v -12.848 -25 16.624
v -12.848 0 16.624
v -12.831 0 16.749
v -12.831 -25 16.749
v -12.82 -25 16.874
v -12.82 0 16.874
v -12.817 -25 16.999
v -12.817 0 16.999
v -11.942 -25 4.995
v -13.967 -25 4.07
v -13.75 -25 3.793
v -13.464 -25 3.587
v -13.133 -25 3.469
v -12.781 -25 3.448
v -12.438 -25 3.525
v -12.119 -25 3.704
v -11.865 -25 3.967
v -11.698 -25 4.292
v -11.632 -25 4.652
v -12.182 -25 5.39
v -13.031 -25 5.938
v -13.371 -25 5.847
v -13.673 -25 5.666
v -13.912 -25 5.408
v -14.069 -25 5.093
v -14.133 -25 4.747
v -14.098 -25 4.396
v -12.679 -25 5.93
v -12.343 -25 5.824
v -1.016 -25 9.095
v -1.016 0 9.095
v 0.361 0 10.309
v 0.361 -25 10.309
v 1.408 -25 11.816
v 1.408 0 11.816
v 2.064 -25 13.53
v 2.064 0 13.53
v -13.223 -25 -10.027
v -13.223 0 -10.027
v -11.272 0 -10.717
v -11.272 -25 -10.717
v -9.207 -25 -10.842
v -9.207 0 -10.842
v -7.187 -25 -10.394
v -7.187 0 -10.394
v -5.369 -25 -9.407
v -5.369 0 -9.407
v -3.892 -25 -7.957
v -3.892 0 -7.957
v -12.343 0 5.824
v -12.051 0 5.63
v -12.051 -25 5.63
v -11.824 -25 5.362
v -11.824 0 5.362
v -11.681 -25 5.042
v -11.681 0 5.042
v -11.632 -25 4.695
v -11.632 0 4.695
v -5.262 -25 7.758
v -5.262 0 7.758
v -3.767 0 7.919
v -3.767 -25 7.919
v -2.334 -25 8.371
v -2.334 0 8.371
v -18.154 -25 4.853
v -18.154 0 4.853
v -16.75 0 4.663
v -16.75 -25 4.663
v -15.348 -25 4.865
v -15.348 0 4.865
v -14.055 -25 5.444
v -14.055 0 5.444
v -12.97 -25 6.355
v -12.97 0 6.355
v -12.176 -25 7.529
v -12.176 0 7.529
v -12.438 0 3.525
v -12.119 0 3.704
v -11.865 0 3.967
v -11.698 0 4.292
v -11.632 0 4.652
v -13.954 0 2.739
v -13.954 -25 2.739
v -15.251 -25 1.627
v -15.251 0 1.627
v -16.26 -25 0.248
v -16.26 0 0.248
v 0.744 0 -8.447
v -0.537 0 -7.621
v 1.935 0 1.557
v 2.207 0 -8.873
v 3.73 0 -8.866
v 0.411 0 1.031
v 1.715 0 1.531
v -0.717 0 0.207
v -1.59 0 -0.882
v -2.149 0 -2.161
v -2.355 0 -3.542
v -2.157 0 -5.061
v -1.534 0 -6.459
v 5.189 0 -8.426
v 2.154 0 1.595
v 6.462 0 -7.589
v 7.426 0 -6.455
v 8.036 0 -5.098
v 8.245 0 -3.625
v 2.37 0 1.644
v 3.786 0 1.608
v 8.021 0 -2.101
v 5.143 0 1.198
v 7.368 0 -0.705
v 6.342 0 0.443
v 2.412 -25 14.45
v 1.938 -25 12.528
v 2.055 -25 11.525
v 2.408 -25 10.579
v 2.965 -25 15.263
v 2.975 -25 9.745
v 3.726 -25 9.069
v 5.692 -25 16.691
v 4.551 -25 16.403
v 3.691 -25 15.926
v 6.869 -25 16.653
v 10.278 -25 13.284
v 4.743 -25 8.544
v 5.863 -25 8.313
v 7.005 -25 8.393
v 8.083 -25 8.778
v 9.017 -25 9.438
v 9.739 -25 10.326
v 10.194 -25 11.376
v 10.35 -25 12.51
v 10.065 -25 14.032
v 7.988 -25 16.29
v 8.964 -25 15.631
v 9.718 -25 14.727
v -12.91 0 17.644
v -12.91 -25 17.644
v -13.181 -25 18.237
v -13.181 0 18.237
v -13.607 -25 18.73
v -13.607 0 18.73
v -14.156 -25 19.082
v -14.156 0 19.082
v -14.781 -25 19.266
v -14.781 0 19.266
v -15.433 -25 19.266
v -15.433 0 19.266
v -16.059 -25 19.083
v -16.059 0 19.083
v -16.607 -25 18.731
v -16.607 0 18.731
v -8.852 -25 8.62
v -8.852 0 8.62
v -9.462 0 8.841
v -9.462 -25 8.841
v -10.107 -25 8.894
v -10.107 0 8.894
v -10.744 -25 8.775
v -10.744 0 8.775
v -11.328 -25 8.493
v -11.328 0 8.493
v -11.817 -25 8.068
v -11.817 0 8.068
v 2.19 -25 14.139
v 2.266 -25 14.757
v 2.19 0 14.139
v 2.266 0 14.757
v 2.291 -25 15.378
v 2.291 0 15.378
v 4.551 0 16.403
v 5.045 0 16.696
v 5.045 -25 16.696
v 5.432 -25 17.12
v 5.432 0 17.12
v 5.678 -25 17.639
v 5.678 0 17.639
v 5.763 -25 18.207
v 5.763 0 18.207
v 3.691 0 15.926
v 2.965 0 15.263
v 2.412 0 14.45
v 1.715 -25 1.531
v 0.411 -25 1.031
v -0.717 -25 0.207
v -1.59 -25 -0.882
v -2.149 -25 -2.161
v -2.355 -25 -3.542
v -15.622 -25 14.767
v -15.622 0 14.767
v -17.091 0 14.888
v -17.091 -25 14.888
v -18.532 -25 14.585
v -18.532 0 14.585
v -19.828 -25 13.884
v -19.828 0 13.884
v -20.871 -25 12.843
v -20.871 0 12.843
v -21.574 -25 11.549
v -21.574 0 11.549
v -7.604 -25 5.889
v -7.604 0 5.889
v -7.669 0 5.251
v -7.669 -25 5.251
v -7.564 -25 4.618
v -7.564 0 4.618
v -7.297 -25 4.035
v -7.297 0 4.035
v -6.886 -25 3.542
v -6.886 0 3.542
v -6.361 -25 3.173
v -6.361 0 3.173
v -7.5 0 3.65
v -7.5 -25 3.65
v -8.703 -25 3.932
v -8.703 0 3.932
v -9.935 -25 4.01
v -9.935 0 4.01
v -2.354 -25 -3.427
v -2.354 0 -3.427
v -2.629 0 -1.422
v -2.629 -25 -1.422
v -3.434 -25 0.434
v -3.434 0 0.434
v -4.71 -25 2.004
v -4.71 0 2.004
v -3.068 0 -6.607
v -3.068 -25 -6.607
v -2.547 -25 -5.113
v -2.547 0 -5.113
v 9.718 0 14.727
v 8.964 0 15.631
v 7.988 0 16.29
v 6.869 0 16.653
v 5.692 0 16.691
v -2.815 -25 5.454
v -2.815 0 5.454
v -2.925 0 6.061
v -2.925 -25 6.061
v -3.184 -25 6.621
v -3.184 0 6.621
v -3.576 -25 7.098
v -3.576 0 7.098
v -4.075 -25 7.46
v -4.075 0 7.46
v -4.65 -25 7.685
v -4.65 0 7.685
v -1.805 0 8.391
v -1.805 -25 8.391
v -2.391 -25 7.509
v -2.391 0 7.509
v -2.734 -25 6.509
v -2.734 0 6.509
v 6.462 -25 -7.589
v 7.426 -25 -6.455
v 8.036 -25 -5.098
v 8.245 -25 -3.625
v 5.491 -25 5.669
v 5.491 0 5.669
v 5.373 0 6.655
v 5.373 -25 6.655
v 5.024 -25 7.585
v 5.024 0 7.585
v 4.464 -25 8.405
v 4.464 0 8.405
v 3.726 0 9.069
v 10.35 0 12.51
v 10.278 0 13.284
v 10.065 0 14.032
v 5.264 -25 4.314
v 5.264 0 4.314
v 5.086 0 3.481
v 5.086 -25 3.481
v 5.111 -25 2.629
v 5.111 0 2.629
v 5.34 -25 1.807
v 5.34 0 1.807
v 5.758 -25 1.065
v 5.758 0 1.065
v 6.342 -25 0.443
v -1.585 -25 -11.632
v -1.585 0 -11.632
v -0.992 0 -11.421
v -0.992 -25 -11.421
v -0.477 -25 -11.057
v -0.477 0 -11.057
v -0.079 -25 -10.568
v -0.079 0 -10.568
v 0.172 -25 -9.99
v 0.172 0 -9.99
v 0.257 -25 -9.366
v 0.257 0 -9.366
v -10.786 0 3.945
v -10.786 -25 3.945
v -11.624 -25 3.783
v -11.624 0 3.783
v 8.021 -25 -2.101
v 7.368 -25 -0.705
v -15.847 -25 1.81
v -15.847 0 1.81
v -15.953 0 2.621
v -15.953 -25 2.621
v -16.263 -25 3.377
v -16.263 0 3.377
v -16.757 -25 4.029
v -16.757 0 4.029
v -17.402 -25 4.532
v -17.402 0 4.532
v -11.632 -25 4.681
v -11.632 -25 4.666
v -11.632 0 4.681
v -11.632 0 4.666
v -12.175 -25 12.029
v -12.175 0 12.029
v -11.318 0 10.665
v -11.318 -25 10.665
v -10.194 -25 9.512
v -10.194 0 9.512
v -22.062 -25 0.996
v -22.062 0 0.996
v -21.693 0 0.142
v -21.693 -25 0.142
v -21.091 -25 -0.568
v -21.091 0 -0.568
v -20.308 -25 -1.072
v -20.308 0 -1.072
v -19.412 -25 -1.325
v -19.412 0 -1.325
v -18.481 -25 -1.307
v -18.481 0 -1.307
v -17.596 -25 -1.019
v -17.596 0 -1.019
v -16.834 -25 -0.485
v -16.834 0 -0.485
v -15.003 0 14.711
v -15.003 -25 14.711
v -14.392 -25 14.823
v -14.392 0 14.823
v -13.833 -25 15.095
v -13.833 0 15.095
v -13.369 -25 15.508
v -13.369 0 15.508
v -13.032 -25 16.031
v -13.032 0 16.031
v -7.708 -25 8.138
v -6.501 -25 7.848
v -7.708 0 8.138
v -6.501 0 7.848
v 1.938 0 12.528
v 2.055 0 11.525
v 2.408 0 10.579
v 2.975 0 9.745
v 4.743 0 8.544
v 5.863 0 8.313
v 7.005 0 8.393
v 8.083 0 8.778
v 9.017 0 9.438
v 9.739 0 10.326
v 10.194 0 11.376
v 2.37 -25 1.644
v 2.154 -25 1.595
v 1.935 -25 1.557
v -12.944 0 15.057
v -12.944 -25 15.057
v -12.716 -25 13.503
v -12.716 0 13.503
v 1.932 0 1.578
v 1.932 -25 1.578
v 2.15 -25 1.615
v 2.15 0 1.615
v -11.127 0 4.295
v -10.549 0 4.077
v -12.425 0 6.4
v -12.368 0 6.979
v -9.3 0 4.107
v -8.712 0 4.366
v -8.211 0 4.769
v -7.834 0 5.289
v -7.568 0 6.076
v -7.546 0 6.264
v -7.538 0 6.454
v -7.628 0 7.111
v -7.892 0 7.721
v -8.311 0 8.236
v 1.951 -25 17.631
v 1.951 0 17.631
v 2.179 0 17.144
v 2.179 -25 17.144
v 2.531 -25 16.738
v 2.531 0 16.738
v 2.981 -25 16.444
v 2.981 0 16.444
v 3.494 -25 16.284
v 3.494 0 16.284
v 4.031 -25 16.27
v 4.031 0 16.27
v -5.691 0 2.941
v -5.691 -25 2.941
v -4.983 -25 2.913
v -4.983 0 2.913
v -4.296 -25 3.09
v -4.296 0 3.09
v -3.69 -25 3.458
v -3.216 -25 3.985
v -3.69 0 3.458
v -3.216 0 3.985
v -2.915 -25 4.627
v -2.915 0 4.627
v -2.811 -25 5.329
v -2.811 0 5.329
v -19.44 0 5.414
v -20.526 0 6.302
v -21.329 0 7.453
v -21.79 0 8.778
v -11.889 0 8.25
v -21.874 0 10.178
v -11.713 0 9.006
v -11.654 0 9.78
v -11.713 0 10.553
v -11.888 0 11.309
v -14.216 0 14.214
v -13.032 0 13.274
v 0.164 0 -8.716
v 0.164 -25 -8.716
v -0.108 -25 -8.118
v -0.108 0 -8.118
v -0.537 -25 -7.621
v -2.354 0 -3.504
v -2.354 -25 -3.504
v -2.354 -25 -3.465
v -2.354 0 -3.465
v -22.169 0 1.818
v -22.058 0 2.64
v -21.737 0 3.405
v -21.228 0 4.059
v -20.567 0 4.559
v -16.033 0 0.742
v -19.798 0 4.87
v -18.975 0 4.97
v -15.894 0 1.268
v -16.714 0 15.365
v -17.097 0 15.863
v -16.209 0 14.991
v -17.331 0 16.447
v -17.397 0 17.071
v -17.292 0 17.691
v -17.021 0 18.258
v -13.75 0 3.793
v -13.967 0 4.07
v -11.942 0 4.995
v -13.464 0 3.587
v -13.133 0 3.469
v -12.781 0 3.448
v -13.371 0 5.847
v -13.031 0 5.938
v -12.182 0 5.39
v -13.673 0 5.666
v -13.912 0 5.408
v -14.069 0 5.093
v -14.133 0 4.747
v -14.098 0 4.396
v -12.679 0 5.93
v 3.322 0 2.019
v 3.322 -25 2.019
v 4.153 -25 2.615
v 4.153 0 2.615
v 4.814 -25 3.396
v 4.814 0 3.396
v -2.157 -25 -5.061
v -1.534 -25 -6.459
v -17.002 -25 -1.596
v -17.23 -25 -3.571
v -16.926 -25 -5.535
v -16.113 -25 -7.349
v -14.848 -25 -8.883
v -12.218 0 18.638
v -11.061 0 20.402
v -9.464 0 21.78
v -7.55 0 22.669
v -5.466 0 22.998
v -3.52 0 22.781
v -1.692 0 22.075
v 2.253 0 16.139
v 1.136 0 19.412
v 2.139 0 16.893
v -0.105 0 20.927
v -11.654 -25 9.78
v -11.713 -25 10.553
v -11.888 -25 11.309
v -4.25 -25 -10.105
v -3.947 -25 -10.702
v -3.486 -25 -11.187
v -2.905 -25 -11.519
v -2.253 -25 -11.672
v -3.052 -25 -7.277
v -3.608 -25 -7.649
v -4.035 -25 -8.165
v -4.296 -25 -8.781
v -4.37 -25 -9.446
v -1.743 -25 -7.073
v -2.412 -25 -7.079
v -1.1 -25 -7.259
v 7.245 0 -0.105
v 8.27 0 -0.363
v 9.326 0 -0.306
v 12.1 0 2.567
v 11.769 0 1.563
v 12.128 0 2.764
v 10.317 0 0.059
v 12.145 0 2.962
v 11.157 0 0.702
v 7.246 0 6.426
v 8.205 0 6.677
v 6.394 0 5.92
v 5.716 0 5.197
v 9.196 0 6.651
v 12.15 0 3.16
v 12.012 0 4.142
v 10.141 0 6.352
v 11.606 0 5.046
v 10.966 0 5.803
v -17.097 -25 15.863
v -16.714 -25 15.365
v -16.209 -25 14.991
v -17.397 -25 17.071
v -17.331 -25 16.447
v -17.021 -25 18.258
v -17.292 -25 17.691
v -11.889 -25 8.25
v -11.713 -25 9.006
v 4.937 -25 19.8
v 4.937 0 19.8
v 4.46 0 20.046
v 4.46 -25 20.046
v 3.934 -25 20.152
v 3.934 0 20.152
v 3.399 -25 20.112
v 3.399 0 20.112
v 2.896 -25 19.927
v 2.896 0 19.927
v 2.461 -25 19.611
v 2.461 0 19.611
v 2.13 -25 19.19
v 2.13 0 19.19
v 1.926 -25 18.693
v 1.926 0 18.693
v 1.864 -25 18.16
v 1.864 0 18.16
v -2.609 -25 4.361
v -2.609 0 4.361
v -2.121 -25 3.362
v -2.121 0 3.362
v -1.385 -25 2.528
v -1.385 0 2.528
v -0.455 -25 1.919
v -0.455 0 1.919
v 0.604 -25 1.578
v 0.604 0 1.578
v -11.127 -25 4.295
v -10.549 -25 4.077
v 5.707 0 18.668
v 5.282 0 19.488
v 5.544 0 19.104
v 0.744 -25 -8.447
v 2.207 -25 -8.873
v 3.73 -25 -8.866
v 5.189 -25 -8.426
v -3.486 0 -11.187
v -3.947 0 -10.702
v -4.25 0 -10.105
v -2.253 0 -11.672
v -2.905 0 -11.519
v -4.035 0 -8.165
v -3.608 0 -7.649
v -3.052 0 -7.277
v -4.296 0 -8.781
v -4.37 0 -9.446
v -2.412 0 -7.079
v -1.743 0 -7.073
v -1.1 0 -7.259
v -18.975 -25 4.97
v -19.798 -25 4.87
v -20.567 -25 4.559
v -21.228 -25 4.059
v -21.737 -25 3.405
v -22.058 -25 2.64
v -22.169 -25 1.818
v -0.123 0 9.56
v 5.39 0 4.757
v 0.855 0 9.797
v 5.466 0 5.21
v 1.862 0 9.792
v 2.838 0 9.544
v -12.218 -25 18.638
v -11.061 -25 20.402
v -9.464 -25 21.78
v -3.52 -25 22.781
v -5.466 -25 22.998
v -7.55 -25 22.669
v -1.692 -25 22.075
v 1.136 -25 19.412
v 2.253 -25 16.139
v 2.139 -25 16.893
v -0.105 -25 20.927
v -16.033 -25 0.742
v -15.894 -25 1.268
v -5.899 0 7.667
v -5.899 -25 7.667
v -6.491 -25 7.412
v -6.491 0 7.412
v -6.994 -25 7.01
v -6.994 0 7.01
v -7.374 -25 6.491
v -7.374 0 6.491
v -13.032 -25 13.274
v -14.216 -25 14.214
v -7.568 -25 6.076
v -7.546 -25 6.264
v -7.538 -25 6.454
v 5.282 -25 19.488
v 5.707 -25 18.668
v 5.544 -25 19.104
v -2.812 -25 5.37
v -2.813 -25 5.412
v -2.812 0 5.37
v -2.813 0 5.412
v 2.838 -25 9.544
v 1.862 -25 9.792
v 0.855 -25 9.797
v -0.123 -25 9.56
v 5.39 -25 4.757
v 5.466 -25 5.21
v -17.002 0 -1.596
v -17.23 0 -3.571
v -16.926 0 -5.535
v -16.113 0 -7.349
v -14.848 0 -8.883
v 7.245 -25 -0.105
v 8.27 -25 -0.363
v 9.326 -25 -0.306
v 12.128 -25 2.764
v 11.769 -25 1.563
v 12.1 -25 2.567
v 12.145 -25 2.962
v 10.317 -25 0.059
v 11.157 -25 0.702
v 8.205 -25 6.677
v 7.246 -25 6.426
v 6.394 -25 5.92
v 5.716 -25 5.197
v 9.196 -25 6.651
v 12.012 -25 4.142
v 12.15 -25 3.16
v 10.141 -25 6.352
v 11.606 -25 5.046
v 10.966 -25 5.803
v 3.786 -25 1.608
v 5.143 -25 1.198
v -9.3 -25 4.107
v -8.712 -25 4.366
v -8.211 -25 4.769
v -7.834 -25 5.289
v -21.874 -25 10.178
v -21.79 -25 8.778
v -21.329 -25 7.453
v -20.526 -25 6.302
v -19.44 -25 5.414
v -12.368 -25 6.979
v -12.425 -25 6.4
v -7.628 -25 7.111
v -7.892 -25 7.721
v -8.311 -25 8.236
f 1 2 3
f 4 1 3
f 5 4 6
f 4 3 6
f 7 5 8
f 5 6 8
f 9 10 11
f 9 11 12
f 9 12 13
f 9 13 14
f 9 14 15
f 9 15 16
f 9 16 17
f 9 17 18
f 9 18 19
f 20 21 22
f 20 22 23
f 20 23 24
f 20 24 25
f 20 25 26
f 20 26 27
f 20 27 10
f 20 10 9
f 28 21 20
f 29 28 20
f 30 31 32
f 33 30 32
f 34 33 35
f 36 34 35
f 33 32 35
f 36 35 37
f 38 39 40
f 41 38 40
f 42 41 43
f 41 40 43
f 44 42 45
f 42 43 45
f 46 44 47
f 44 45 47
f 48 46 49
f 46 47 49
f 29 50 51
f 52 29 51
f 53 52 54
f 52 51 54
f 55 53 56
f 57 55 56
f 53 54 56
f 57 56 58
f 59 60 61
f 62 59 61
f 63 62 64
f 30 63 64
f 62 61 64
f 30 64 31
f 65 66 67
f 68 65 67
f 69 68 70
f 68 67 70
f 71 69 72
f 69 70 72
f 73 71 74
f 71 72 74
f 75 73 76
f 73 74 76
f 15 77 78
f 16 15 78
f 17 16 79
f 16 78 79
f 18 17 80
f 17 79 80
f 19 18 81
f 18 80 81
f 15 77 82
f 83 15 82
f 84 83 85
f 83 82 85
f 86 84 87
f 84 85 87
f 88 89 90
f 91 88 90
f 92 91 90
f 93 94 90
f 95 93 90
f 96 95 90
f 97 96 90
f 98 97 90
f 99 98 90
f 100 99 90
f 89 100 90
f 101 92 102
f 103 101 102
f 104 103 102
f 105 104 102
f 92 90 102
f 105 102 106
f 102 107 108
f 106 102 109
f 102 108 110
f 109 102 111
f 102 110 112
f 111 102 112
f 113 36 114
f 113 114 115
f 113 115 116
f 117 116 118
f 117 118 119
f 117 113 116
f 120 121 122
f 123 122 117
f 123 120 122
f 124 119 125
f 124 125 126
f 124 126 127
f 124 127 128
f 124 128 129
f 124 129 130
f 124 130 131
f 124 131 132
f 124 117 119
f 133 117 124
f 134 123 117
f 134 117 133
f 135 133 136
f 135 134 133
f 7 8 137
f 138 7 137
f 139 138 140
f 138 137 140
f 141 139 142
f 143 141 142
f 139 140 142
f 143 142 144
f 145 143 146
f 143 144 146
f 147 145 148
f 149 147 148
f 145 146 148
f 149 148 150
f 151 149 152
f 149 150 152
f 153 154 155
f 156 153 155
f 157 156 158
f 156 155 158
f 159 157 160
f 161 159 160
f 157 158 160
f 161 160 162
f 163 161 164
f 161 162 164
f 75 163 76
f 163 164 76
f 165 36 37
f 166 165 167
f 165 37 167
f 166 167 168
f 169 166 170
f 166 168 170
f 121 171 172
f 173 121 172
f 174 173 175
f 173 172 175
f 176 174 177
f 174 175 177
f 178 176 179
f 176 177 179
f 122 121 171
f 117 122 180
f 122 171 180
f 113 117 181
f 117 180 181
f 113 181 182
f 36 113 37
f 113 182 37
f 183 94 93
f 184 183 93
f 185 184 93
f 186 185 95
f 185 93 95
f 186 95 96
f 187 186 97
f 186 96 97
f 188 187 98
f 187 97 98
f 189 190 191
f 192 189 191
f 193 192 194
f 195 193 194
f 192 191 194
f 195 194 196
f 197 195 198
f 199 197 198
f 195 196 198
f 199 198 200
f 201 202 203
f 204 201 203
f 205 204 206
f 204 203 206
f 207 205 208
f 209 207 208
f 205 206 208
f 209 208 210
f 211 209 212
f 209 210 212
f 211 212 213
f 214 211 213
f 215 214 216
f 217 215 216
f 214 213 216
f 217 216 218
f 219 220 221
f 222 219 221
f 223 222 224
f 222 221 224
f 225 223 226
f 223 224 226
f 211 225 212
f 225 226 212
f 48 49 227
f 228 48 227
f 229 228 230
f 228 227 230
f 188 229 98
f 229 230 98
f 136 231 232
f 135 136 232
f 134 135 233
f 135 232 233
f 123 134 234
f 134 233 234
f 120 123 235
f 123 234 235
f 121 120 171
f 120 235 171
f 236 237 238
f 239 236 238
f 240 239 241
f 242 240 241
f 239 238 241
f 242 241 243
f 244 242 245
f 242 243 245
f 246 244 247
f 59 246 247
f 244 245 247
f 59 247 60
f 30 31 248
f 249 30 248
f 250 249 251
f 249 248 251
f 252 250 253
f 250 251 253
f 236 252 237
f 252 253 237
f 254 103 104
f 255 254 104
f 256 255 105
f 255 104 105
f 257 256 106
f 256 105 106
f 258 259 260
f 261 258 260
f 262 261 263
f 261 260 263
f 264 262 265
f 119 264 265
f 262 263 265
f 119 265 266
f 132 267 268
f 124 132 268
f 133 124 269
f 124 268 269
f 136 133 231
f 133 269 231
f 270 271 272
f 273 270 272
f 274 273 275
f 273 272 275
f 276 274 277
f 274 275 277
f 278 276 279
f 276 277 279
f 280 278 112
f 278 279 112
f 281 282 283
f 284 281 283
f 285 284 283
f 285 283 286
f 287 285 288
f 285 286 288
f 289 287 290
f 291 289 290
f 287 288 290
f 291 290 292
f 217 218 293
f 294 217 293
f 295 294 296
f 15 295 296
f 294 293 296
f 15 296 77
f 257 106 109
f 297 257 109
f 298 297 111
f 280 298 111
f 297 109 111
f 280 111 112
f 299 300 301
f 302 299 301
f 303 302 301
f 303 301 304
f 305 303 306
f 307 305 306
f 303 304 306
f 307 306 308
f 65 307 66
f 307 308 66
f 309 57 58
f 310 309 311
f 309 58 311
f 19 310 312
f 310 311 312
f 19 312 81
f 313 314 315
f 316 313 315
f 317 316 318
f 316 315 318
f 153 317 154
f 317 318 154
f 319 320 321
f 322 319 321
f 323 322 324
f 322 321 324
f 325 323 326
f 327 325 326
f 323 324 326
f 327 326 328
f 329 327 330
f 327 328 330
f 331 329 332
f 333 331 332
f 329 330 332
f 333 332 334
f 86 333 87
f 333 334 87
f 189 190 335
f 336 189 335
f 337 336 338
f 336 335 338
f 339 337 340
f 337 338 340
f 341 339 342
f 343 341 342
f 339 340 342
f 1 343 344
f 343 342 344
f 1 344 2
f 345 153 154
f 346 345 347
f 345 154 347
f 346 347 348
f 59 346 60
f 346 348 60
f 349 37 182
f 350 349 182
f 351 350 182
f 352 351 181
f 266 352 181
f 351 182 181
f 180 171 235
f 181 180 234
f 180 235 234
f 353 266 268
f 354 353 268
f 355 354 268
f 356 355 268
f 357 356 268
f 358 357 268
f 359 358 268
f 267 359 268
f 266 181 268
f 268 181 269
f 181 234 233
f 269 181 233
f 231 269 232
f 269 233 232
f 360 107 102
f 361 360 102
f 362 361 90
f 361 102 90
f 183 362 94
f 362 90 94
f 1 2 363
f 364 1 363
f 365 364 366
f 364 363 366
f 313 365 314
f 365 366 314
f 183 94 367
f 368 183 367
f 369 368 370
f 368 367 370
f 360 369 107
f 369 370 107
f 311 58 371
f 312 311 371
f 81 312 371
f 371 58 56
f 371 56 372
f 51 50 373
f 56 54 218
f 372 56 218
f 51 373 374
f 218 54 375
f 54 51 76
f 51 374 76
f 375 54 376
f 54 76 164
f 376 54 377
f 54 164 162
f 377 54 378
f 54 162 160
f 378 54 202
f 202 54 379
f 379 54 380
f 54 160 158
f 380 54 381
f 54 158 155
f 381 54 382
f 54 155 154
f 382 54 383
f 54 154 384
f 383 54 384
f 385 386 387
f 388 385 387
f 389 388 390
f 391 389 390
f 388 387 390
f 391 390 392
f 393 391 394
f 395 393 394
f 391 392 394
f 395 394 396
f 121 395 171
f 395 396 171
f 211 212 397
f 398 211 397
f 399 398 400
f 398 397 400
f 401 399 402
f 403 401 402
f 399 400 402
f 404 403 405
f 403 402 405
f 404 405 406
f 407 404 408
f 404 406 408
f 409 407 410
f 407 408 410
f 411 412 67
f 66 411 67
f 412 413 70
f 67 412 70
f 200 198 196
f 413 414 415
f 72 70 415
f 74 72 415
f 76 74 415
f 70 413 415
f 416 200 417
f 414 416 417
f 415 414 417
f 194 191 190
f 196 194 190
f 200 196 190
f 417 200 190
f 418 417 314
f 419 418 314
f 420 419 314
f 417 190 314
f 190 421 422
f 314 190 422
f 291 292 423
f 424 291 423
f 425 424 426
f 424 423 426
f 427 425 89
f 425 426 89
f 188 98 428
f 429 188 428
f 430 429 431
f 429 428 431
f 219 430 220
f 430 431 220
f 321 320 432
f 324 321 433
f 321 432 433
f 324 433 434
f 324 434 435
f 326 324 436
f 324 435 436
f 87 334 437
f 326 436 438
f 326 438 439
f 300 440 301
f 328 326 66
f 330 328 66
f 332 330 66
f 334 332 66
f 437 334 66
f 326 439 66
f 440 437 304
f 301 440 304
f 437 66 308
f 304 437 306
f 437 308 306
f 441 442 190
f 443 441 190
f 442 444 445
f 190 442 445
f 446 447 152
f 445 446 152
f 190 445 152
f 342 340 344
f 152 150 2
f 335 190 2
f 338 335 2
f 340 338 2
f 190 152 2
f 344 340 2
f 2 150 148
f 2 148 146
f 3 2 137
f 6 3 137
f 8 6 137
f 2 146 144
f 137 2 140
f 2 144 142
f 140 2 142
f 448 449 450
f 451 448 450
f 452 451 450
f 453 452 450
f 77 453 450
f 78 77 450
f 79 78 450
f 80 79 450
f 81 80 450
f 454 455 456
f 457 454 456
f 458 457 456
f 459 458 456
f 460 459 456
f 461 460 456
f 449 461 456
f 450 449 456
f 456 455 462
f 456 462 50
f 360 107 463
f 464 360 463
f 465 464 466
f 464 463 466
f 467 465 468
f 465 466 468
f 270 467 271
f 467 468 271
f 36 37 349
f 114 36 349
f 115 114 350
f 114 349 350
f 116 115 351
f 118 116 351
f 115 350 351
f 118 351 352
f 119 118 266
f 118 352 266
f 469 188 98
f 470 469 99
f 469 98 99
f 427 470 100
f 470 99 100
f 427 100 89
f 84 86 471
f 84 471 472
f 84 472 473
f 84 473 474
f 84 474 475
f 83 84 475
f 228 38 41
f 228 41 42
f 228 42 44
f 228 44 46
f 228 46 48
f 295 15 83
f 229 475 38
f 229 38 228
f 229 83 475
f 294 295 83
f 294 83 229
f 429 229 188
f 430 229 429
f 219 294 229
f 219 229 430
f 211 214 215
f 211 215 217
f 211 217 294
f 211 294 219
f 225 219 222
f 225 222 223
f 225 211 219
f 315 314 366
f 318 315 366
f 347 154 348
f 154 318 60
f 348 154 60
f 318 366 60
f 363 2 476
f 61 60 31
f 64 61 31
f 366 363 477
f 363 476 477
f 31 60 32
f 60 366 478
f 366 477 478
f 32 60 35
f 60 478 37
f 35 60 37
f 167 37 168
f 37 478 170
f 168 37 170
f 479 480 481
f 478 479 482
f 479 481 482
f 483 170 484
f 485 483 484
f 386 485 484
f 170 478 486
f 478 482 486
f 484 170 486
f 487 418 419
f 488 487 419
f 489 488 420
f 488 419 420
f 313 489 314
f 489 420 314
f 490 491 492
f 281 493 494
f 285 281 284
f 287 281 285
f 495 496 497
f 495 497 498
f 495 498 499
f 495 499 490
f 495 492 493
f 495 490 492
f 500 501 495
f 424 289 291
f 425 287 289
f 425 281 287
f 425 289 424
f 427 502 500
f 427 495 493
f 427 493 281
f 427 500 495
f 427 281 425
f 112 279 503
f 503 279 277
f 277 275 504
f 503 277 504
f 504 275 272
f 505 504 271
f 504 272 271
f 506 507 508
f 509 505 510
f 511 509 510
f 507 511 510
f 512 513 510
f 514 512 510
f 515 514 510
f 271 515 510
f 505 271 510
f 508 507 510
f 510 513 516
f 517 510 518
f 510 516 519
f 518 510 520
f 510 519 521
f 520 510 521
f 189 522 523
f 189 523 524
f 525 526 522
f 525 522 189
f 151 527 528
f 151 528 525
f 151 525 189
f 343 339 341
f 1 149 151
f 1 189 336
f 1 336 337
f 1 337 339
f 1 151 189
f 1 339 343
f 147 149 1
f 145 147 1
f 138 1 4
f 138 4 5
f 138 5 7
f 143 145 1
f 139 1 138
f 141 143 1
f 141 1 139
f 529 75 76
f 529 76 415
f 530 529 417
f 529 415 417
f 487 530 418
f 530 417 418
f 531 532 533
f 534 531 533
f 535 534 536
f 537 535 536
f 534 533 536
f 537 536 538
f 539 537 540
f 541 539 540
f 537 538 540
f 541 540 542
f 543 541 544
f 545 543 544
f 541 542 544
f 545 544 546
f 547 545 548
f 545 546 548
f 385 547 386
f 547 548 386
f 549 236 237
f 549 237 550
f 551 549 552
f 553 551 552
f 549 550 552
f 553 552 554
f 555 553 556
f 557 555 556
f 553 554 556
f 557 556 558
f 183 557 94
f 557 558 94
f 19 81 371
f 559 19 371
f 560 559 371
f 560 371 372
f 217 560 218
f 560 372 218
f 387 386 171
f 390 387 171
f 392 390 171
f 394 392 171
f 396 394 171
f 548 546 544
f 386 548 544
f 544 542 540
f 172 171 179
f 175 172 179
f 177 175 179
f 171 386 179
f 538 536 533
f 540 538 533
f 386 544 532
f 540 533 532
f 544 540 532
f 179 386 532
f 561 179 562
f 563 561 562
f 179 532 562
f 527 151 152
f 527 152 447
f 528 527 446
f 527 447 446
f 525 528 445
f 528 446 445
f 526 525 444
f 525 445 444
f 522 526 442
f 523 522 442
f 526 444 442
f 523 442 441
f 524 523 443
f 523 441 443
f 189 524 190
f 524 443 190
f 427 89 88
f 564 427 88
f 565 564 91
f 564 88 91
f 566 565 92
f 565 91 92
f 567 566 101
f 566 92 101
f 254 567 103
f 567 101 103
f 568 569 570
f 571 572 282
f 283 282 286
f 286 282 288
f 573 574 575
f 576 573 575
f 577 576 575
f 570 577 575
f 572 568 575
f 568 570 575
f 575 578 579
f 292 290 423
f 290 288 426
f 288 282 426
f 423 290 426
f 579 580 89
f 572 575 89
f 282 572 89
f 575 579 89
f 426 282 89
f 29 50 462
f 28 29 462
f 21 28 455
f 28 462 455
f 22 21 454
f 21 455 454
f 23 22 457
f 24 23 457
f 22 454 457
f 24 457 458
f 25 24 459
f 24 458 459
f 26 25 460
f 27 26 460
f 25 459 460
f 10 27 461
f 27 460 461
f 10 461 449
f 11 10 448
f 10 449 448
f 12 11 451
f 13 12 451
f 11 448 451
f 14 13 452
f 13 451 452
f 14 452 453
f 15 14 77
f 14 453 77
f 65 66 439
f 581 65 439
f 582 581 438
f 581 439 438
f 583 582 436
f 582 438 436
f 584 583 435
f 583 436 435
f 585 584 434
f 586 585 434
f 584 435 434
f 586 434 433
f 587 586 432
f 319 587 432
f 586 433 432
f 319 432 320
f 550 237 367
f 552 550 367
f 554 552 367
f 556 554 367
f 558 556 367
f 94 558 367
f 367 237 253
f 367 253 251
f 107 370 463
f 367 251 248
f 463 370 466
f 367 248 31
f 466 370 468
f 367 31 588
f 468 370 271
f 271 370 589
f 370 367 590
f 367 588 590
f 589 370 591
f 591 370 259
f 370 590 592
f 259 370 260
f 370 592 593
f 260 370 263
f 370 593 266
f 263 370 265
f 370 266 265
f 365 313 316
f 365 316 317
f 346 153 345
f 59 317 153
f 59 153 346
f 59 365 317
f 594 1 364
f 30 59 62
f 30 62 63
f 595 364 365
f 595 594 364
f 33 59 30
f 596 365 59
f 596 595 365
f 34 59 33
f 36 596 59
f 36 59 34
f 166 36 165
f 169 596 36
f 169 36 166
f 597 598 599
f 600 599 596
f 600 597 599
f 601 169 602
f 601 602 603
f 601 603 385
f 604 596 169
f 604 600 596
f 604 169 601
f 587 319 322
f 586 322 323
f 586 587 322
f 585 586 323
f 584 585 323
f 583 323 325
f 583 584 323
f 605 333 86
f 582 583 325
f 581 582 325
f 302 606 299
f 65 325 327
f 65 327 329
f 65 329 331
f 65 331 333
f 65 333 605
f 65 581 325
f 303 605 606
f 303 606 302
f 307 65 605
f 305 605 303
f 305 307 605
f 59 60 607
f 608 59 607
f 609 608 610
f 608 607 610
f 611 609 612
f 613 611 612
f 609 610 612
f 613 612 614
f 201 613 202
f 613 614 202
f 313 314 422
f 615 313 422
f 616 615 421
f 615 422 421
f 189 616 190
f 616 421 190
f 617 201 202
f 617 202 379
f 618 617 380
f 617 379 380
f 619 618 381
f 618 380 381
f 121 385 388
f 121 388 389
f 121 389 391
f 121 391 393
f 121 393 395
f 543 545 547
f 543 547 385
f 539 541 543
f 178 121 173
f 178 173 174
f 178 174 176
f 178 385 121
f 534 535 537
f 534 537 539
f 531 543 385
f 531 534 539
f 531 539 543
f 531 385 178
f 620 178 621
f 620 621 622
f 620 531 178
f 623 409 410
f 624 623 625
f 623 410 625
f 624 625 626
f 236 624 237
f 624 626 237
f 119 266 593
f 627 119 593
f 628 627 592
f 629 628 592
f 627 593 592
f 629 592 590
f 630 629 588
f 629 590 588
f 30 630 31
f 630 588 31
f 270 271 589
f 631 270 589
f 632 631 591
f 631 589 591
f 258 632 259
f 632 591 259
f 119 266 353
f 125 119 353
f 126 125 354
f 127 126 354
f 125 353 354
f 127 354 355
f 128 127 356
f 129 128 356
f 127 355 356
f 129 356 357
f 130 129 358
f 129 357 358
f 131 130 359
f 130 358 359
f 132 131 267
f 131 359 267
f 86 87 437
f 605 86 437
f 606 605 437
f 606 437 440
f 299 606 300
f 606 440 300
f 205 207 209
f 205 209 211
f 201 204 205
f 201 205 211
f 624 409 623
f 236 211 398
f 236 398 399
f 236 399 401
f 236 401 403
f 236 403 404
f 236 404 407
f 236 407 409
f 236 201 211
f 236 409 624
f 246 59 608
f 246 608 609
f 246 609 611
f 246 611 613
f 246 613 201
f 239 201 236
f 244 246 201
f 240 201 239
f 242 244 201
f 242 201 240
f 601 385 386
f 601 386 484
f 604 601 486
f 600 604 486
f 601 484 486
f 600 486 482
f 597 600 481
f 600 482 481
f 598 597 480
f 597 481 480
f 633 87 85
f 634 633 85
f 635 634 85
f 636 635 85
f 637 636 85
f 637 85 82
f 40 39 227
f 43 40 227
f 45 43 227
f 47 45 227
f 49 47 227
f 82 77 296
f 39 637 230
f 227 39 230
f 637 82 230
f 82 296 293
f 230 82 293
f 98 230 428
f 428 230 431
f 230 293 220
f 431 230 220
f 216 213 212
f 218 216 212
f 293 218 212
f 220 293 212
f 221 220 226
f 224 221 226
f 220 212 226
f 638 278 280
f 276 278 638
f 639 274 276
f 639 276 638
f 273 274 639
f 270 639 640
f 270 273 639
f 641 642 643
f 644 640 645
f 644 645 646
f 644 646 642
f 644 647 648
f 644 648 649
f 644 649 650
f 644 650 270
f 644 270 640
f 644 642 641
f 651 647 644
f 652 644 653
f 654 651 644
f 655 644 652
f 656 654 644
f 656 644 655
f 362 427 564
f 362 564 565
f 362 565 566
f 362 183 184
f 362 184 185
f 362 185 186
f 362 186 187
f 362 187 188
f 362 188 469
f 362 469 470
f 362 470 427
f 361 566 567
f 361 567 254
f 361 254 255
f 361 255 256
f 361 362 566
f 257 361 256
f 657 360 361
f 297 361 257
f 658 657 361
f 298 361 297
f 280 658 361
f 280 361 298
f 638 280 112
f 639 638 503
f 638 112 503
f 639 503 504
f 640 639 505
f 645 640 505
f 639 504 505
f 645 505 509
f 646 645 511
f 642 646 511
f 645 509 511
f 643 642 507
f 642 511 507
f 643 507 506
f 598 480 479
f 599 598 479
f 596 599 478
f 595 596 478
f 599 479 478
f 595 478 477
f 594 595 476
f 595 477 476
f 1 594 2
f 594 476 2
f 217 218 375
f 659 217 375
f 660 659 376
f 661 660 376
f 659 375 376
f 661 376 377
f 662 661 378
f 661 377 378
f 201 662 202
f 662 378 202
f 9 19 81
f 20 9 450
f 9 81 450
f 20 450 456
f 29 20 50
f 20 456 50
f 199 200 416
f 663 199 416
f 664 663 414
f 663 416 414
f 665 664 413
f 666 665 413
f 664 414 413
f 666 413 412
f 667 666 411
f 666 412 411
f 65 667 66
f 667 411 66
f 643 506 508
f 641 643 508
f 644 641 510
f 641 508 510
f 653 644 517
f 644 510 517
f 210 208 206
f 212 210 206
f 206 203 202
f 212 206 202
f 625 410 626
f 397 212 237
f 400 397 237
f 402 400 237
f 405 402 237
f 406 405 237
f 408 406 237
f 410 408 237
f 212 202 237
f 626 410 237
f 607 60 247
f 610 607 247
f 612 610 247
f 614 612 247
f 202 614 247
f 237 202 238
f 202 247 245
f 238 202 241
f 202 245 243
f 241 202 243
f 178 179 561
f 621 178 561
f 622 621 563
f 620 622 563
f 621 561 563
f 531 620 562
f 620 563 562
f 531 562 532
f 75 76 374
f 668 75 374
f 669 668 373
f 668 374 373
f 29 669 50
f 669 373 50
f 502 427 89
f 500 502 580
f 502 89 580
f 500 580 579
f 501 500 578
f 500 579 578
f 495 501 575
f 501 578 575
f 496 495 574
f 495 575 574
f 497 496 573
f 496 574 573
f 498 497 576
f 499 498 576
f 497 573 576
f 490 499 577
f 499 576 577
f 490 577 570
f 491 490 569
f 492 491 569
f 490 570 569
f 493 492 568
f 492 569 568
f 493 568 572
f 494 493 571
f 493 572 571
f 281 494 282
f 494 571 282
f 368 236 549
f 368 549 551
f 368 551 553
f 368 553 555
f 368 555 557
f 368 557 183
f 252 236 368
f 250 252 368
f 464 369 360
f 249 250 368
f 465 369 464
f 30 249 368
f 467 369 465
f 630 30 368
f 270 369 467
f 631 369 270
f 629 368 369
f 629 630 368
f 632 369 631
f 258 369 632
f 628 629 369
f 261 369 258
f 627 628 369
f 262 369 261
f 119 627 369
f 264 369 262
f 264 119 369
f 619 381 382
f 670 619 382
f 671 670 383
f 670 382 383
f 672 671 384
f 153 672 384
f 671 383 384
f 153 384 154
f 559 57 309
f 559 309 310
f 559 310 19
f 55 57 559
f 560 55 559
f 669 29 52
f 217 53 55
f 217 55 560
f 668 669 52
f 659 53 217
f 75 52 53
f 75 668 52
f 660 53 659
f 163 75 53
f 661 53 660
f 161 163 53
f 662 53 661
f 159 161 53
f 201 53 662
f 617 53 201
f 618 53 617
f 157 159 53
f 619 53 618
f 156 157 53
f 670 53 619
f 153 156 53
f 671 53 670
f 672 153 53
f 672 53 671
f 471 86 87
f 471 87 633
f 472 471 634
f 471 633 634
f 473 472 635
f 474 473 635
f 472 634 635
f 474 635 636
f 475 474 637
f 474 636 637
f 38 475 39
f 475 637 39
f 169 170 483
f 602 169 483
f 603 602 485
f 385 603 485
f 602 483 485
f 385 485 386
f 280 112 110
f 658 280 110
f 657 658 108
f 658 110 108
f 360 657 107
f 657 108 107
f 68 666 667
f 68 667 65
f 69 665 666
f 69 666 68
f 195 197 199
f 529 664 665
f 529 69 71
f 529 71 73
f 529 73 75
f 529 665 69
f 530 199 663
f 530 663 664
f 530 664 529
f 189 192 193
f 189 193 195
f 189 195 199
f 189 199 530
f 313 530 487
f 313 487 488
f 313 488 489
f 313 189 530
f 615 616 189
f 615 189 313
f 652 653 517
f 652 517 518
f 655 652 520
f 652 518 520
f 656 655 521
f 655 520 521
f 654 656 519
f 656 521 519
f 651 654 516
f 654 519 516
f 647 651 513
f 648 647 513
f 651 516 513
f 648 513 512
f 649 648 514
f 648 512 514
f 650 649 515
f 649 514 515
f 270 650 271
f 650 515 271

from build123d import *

# Parameters (mm, degrees)
F1_DEPTH = 25


with BuildPart() as f1:
    # F0 (on Front) → F1 (new body)
    with BuildSketch(Plane.XZ):
        with BuildLine():
            ThreePointArc((5.7626735296, 18.2068185772), (5.5440334867, 19.1038326622), (4.9371574202, 19.7996337666))
            ThreePointArc((4.9371574202, 19.7996337666), (2.6676542913, 19.7840860436), (1.950941795, 17.6306679741))
            ThreePointArc((1.950941795, 17.6306679741), (2.9808259559, 16.4440816437), (4.5514713081, 16.4025884885))
            ThreePointArc((4.5514713081, 16.4025884885), (5.4317920066, 17.120280838), (5.7626735296, 18.2068185772))
        make_face()
    extrude(amount=F1_DEPTH)


with BuildPart() as f1b:
    # F0 (on Front) → F1, piece 2 (new body)
    with BuildSketch(Plane.XZ):
        with BuildLine():
            ThreePointArc((-12.8170463238, 16.998939244), (-14.1557782115, 19.0824757789), (-16.6072249698, 18.7307139985))
            ThreePointArc((-16.6072249698, 18.7307139985), (-17.330896065, 16.4465640369), (-15.6223084147, 14.7667518025))
            ThreePointArc((-15.6223084147, 14.7667518025), (-13.8333021611, 15.0954831526), (-12.8478752698, 16.6243852154))
            ThreePointArc((-12.8478752698, 16.6243852154), (-12.8247665698, 16.8110289301), (-12.8170463238, 16.998939244))
        make_face()
    extrude(amount=F1_DEPTH)


with BuildPart() as f1c:
    # F0 (on Front) → F1, piece 3 (new body)
    with BuildSketch(Plane.XZ):
        with BuildLine():
            ThreePointArc((-18.1541618813, 4.8529809017), (-21.2283091664, 4.0593839103), (-22.0623639759, 0.9959658373))
            ThreePointArc((-22.0623639759, 0.9959658373), (-19.4120806995, -1.3252973975), (-16.2598217859, 0.2480837362))
            ThreePointArc((-16.2598217859, 0.2480837362), (-15.9520675559, 1.0020555041), (-15.8471616638, 1.8096326501))
            ThreePointArc((-15.8471616638, 1.8096326501), (-16.489096527, 3.7190971421), (-18.1541618813, 4.8529809017))
        make_face()
    extrude(amount=F1_DEPTH)


with BuildPart() as f1d:
    # F0 (on Front) → F1, piece 4 (new body)
    with BuildSketch(Plane.XZ):
        with BuildLine():
            ThreePointArc((6.3419072898, 0.4434269365), (9.8353686182, -0.1606527791), (12.1001983787, 2.5669341602))
            ThreePointArc((12.1001983787, 2.5669341602), (12.137749391, 2.862587446), (12.1502960439, 3.160351657))
            ThreePointArc((12.1502960439, 3.160351657), (9.195696333, 6.6512974662), (5.2644278529, 4.3143143187))
            ThreePointArc((5.2644278529, 4.3143143187), (5.2006827015, 2.2111661728), (6.3419072898, 0.4434269365))
        make_face()
    extrude(amount=F1_DEPTH)


with BuildPart() as f1e:
    # F0 (on Front) → F1, piece 5 (new body)
    with BuildSketch(Plane.XZ):
        with BuildLine():
            ThreePointArc((-3.8924364768, -7.9568163614), (-4.0168333131, -10.5966982185), (-1.5851739128, -11.6318230194))
            ThreePointArc((-1.5851739128, -11.6318230194), (-0.2614280959, -10.8263222218), (0.2573500675, -9.3661839612))
            ThreePointArc((0.2573500675, -9.3661839612), (0.0494894989, -8.4076097477), (-0.5367526285, -7.6212315266))
            ThreePointArc((-0.5367526285, -7.6212315266), (-2.2871555809, -7.06344923), (-3.8924364768, -7.9568163614))
        make_face()
    extrude(amount=F1_DEPTH)


with BuildPart() as f1f:
    # F0 (on Front) → F1, piece 6 (new body)
    with BuildSketch(Plane.XZ):
        with BuildLine():
            ThreePointArc((10.3500283219, 12.5099443379), (10.1889274826, 13.6628470044), (9.7179665193, 14.7274285231))
            ThreePointArc((9.7179665193, 14.7274285231), (7.4413673069, 16.5107674109), (4.5514713081, 16.4025884885))
            ThreePointArc((4.5514713081, 16.4025884885), (2.964750147, 15.2632497635), (2.0638612521, 13.5299938758))
            ThreePointArc((2.0638612521, 13.5299938758), (2.2028422722, 11.0418321751), (3.7255170757, 9.0690864198))
            ThreePointArc((3.7255170757, 9.0690864198), (8.0828240046, 8.7775304921), (10.3500283219, 12.5099443379))
        make_face()
    extrude(amount=F1_DEPTH)


with BuildPart() as f1g:
    # F0 (on Front) → F1, piece 7 (new body)
    with BuildSketch(Plane.XZ):
        with BuildLine():
            ThreePointArc((-15.6223084147, 14.7667518025), (-19.2057930579, 14.2815966741), (-21.5738585046, 11.548648865))
            ThreePointArc((-21.5738585046, 11.548648865), (-21.3291753608, 7.4525071112), (-18.1541618813, 4.8529809017))
            ThreePointArc((-18.1541618813, 4.8529809017), (-14.6811105069, 5.1092692274), (-12.1762622463, 7.5286709608))
            ThreePointArc((-12.1762622463, 7.5286709608), (-11.7865542561, 8.6245492106), (-11.654375537, 9.7801227662))
            ThreePointArc((-11.654375537, 9.7801227662), (-11.7862422785, 10.9343496046), (-12.1750465309, 12.0290914395))
            ThreePointArc((-12.1750465309, 12.0290914395), (-13.5892621294, 13.7875374163), (-15.6223084147, 14.7667518025))
        make_face()
    extrude(amount=F1_DEPTH)


with BuildPart() as f1h:
    # F0 (on Front) → F1, piece 8 (new body)
    with BuildSketch(Plane.XZ):
        with BuildLine():
            ThreePointArc((-0.5367526285, -7.6212315266), (2.9687895045, -8.9249486788), (6.4623414593, -7.589434247))
            ThreePointArc((6.4623414593, -7.589434247), (7.778744061, -5.7982835776), (8.2448746106, -3.624839573))
            ThreePointArc((8.2448746106, -3.624839573), (7.7456187511, -1.3791728003), (6.3419072898, 0.4434269365))
            ThreePointArc((6.3419072898, 0.4434269365), (4.4781957863, 1.448636567), (2.369716834, 1.6440424949))
            ThreePointArc((2.369716834, 1.6440424949), (2.0445978098, 1.57425377), (1.7149399217, 1.5306817276))
            ThreePointArc((1.7149399217, 1.5306817276), (-1.1895362356, -0.3082543281), (-2.354812058, -3.5424157068))
            ThreePointArc((-2.354812058, -3.5424157068), (-1.8963236613, -5.7826443764), (-0.5367526285, -7.6212315266))
        make_face()
    extrude(amount=F1_DEPTH)


with BuildPart() as f1i:
    # F0 (on Front) → F1, piece 9 (new body)
    with BuildSketch(Plane.XZ):
        with BuildLine():
            ThreePointArc((-16.2598217859, 0.2480837362), (-16.9259083599, -5.5350438662), (-13.2230356777, -10.0269221024))
            ThreePointArc((-13.2230356777, -10.0269221024), (-8.1812796487, -10.688673401), (-3.8924364768, -7.9568163614))
            ThreePointArc((-3.8924364768, -7.9568163614), (-2.7678513646, -5.8735388824), (-2.354812058, -3.5424157068))
            ThreePointArc((-2.354812058, -3.5424157068), (-2.3541374229, -3.4845785693), (-2.35391254, -3.4267379344))
            ThreePointArc((-2.35391254, -3.4267379344), (-3.4341750773, 0.4338489137), (-6.3611992123, 3.1731239408))
            ThreePointArc((-6.3611992123, 3.1731239408), (-8.0956497276, 3.8156683867), (-9.9350130843, 4.0104102597))
            ThreePointArc((-9.9350130843, 4.0104102597), (-11.2073952045, 3.8759581536), (-12.437914197, 3.5254490416))
            ThreePointArc((-12.437914197, 3.5254490416), (-14.6345789592, 2.2199489347), (-16.2598217859, 0.2480837362))
        make_face()
    extrude(amount=F1_DEPTH)


with BuildPart() as f1j:
    # F0 (on Front) → F1, piece 10 (new body)
    with BuildSketch(Plane.XZ):
        with BuildLine():
            ThreePointArc((1.950941795, 17.6306679741), (-0.8618829458, 21.5523171676), (-5.4663772752, 22.9979822013))
            ThreePointArc((-5.4663772752, 22.9979822013), (-10.3101085379, 21.1464950402), (-12.8478752698, 16.6243852154))
            ThreePointArc((-12.8478752698, 16.6243852154), (-12.8700411182, 14.2742361181), (-12.1750465309, 12.0290914395))
            ThreePointArc((-12.1750465309, 12.0290914395), (-10.7866358977, 10.0586829032), (-8.8522924145, 8.620451637))
            ThreePointArc((-8.8522924145, 8.620451637), (-7.1102469071, 7.9683441408), (-5.2621163668, 7.7576779549))
            ThreePointArc((-5.2621163668, 7.7576779549), (-3.0394040602, 8.1096154965), (-1.0163853263, 9.0953665977))
            ThreePointArc((-1.0163853263, 9.0953665977), (0.9296417504, 11.0307436332), (2.0638612521, 13.5299938758))
            ThreePointArc((2.0638612521, 13.5299938758), (2.2342956162, 14.4471685778), (2.2913922532, 15.3782954653))
            ThreePointArc((2.2913922532, 15.3782954653), (2.205798974, 16.5172740026), (1.950941795, 17.6306679741))
        make_face()
    extrude(amount=F1_DEPTH)


with BuildPart() as f1k:
    # F0 (on Front) → F1, piece 11 (new body)
    with BuildSketch(Plane.XZ):
        with BuildLine():
            ThreePointArc((-7.5382384361, 6.453576661), (-7.8924197134, 7.7206683131), (-8.8522924145, 8.620451637))
            ThreePointArc((-8.8522924145, 8.620451637), (-10.7443963127, 8.7751677225), (-12.1762622463, 7.5286709608))
            ThreePointArc((-12.1762622463, 7.5286709608), (-12.4138694439, 6.69139192), (-12.3429593573, 5.8239444391))
            ThreePointArc((-12.3429593573, 5.8239444391), (-11.8242461063, 5.3622212537), (-11.6315631088, 4.6950443663))
            ThreePointArc((-11.6315631088, 4.6950443663), (-11.6317519559, 4.6733046471), (-11.6323184401, 4.6515714894))
            ThreePointArc((-11.6323184401, 4.6515714894), (-10.8453781801, 4.1676235144), (-9.9350130843, 4.0104102597))
            ThreePointArc((-9.9350130843, 4.0104102597), (-8.4481965901, 4.5511698602), (-7.6042618941, 5.8893845148))
            ThreePointArc((-7.6042618941, 5.8893845148), (-7.5548004264, 6.1695555901), (-7.5382384361, 6.453576661))
        make_face()
    extrude(amount=F1_DEPTH)


with BuildPart() as f1l:
    # F0 (on Front) → F1, piece 12 (new body)
    with BuildSketch(Plane.XZ):
        with BuildLine():
            ThreePointArc((-12.3429593573, 5.8239444391), (-14.1333211582, 4.7466983233), (-12.437914197, 3.5254490416))
            ThreePointArc((-12.437914197, 3.5254490416), (-11.8651822142, 3.9669442726), (-11.6323184401, 4.6515714894))
            ThreePointArc((-11.6323184401, 4.6515714894), (-12.071540008, 5.186900802), (-12.3429593573, 5.8239444391))
        make_face()
    extrude(amount=F1_DEPTH)


with BuildPart() as f1m:
    # F0 (on Front) → F1, piece 13 (new body)
    with BuildSketch(Plane.XZ):
        with BuildLine():
            ThreePointArc((-2.8146143964, 5.4541763531), (-3.5757064446, 7.097508605), (-5.2621163668, 7.7576779549))
            ThreePointArc((-5.2621163668, 7.7576779549), (-6.7554986899, 7.2275876196), (-7.6042618941, 5.8893845148))
            ThreePointArc((-7.6042618941, 5.8893845148), (-7.4495736131, 4.3176093399), (-6.3611992123, 3.1731239408))
            ThreePointArc((-6.3611992123, 3.1731239408), (-3.9798403201, 3.2520286783), (-2.8113615874, 5.32850492))
            ThreePointArc((-2.8113615874, 5.32850492), (-2.8121749258, 5.3913616815), (-2.8146143964, 5.4541763531))
        make_face()
    extrude(amount=F1_DEPTH)


with BuildPart() as f1n:
    # F0 (on Front) → F1, piece 14 (new body)
    with BuildSketch(Plane.XZ):
        with BuildLine():
            ThreePointArc((5.4914796786, 5.6691666226), (5.0236576469, 7.5847656504), (3.7255170757, 9.0690864198))
            ThreePointArc((3.7255170757, 9.0690864198), (1.3586820364, 9.8249321819), (-1.0163853263, 9.0953665977))
            ThreePointArc((-1.0163853263, 9.0953665977), (-2.3905466853, 7.5093769069), (-2.8146143964, 5.4541763531))
            ThreePointArc((-2.8146143964, 5.4541763531), (-1.3852899376, 2.5279244985), (1.7149399217, 1.5306817276))
            ThreePointArc((1.7149399217, 1.5306817276), (2.040550028, 1.5976339404), (2.369716834, 1.6440424949))
            ThreePointArc((2.369716834, 1.6440424949), (4.1534585368, 2.6145185951), (5.2644278529, 4.3143143187))
            ThreePointArc((5.2644278529, 4.3143143187), (5.4343236829, 4.9822937637), (5.4914796786, 5.6691666226))
        make_face()
    extrude(amount=F1_DEPTH)


solid = Compound([f1.part, f1b.part, f1c.part, f1d.part, f1e.part, f1f.part, f1g.part, f1h.part, f1i.part, f1j.part, f1k.part, f1l.part, f1m.part, f1n.part])
